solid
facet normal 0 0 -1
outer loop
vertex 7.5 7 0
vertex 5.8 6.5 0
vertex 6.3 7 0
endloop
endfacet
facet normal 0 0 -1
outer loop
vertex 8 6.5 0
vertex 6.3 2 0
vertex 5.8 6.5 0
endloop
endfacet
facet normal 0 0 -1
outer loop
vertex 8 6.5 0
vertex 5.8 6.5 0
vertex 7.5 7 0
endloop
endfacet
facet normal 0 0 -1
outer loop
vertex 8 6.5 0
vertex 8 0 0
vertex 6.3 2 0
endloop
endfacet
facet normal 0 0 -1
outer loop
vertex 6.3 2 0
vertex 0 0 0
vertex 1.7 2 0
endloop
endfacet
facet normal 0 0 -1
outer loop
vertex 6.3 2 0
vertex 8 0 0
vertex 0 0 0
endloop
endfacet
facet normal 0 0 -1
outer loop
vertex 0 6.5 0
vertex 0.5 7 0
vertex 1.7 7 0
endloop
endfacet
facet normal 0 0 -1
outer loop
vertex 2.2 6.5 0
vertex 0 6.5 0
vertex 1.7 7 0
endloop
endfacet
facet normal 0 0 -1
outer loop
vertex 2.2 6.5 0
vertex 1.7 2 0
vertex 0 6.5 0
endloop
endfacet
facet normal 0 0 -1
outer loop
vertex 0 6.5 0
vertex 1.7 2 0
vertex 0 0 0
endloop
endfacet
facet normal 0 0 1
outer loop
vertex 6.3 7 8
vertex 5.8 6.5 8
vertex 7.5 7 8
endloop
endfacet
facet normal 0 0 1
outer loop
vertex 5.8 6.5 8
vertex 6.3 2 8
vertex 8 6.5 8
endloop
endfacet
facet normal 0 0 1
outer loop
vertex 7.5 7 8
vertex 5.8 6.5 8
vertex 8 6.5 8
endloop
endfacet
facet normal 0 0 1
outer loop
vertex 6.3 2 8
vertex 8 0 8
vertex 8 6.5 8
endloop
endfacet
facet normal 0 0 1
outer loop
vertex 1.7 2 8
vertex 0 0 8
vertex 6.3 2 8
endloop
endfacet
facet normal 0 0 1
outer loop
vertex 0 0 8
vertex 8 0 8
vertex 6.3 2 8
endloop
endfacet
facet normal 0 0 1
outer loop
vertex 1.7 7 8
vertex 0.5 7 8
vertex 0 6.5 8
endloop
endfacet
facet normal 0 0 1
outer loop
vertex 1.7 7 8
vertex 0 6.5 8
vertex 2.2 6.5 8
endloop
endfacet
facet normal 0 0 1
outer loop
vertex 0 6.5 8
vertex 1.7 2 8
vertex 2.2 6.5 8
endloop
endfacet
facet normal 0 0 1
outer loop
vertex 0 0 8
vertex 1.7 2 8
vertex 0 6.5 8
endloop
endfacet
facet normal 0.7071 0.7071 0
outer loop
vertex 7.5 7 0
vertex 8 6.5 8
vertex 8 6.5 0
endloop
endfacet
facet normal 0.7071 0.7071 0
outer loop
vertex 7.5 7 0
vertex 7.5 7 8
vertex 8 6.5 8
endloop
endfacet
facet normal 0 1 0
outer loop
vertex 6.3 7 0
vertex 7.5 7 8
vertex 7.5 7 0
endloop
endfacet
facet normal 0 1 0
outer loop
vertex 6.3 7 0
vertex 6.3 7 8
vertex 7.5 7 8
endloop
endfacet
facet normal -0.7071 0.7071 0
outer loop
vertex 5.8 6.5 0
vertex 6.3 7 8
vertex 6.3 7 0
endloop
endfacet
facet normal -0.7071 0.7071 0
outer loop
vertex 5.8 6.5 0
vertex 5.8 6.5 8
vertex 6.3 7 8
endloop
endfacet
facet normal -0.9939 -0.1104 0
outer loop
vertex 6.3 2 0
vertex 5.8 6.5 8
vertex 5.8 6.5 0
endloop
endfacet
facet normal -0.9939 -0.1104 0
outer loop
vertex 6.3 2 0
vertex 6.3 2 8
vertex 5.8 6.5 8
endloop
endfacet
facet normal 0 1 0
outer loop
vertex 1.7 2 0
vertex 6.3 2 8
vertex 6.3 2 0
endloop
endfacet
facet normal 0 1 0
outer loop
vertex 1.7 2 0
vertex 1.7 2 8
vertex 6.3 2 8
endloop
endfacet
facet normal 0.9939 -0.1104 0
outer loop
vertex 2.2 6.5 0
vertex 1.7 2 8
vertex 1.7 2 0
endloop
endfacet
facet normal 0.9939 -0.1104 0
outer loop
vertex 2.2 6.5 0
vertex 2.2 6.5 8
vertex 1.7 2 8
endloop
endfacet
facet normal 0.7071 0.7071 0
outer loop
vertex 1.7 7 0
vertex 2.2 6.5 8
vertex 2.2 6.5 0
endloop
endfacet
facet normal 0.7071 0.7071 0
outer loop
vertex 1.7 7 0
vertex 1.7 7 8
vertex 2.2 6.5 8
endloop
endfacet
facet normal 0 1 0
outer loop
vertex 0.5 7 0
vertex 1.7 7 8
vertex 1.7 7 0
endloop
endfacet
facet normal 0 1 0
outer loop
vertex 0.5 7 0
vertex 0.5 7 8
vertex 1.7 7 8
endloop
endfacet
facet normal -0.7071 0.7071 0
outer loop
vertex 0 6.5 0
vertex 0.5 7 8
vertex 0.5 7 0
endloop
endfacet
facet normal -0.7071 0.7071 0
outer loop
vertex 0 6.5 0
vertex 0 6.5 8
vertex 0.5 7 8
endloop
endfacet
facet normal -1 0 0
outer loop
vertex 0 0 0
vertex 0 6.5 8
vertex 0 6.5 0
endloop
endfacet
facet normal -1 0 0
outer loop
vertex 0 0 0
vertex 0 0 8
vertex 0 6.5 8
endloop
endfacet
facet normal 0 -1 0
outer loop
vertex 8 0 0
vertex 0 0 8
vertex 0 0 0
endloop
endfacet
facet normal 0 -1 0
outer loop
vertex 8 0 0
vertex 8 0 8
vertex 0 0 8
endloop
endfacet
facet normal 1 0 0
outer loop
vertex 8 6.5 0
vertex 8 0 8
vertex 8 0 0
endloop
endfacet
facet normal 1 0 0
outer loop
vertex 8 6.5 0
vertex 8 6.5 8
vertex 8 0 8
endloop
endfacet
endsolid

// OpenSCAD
linear_extrude(height=8) polygon(points=[[0,0], [8, 0], [8, 6.5], [7.5, 7], [6.3, 7], [5.8, 6.5], [6.3, 2], [1.7, 2], [2.2, 6.5], [1.7, 7], [0.5, 7], [0, 6.5]]);
